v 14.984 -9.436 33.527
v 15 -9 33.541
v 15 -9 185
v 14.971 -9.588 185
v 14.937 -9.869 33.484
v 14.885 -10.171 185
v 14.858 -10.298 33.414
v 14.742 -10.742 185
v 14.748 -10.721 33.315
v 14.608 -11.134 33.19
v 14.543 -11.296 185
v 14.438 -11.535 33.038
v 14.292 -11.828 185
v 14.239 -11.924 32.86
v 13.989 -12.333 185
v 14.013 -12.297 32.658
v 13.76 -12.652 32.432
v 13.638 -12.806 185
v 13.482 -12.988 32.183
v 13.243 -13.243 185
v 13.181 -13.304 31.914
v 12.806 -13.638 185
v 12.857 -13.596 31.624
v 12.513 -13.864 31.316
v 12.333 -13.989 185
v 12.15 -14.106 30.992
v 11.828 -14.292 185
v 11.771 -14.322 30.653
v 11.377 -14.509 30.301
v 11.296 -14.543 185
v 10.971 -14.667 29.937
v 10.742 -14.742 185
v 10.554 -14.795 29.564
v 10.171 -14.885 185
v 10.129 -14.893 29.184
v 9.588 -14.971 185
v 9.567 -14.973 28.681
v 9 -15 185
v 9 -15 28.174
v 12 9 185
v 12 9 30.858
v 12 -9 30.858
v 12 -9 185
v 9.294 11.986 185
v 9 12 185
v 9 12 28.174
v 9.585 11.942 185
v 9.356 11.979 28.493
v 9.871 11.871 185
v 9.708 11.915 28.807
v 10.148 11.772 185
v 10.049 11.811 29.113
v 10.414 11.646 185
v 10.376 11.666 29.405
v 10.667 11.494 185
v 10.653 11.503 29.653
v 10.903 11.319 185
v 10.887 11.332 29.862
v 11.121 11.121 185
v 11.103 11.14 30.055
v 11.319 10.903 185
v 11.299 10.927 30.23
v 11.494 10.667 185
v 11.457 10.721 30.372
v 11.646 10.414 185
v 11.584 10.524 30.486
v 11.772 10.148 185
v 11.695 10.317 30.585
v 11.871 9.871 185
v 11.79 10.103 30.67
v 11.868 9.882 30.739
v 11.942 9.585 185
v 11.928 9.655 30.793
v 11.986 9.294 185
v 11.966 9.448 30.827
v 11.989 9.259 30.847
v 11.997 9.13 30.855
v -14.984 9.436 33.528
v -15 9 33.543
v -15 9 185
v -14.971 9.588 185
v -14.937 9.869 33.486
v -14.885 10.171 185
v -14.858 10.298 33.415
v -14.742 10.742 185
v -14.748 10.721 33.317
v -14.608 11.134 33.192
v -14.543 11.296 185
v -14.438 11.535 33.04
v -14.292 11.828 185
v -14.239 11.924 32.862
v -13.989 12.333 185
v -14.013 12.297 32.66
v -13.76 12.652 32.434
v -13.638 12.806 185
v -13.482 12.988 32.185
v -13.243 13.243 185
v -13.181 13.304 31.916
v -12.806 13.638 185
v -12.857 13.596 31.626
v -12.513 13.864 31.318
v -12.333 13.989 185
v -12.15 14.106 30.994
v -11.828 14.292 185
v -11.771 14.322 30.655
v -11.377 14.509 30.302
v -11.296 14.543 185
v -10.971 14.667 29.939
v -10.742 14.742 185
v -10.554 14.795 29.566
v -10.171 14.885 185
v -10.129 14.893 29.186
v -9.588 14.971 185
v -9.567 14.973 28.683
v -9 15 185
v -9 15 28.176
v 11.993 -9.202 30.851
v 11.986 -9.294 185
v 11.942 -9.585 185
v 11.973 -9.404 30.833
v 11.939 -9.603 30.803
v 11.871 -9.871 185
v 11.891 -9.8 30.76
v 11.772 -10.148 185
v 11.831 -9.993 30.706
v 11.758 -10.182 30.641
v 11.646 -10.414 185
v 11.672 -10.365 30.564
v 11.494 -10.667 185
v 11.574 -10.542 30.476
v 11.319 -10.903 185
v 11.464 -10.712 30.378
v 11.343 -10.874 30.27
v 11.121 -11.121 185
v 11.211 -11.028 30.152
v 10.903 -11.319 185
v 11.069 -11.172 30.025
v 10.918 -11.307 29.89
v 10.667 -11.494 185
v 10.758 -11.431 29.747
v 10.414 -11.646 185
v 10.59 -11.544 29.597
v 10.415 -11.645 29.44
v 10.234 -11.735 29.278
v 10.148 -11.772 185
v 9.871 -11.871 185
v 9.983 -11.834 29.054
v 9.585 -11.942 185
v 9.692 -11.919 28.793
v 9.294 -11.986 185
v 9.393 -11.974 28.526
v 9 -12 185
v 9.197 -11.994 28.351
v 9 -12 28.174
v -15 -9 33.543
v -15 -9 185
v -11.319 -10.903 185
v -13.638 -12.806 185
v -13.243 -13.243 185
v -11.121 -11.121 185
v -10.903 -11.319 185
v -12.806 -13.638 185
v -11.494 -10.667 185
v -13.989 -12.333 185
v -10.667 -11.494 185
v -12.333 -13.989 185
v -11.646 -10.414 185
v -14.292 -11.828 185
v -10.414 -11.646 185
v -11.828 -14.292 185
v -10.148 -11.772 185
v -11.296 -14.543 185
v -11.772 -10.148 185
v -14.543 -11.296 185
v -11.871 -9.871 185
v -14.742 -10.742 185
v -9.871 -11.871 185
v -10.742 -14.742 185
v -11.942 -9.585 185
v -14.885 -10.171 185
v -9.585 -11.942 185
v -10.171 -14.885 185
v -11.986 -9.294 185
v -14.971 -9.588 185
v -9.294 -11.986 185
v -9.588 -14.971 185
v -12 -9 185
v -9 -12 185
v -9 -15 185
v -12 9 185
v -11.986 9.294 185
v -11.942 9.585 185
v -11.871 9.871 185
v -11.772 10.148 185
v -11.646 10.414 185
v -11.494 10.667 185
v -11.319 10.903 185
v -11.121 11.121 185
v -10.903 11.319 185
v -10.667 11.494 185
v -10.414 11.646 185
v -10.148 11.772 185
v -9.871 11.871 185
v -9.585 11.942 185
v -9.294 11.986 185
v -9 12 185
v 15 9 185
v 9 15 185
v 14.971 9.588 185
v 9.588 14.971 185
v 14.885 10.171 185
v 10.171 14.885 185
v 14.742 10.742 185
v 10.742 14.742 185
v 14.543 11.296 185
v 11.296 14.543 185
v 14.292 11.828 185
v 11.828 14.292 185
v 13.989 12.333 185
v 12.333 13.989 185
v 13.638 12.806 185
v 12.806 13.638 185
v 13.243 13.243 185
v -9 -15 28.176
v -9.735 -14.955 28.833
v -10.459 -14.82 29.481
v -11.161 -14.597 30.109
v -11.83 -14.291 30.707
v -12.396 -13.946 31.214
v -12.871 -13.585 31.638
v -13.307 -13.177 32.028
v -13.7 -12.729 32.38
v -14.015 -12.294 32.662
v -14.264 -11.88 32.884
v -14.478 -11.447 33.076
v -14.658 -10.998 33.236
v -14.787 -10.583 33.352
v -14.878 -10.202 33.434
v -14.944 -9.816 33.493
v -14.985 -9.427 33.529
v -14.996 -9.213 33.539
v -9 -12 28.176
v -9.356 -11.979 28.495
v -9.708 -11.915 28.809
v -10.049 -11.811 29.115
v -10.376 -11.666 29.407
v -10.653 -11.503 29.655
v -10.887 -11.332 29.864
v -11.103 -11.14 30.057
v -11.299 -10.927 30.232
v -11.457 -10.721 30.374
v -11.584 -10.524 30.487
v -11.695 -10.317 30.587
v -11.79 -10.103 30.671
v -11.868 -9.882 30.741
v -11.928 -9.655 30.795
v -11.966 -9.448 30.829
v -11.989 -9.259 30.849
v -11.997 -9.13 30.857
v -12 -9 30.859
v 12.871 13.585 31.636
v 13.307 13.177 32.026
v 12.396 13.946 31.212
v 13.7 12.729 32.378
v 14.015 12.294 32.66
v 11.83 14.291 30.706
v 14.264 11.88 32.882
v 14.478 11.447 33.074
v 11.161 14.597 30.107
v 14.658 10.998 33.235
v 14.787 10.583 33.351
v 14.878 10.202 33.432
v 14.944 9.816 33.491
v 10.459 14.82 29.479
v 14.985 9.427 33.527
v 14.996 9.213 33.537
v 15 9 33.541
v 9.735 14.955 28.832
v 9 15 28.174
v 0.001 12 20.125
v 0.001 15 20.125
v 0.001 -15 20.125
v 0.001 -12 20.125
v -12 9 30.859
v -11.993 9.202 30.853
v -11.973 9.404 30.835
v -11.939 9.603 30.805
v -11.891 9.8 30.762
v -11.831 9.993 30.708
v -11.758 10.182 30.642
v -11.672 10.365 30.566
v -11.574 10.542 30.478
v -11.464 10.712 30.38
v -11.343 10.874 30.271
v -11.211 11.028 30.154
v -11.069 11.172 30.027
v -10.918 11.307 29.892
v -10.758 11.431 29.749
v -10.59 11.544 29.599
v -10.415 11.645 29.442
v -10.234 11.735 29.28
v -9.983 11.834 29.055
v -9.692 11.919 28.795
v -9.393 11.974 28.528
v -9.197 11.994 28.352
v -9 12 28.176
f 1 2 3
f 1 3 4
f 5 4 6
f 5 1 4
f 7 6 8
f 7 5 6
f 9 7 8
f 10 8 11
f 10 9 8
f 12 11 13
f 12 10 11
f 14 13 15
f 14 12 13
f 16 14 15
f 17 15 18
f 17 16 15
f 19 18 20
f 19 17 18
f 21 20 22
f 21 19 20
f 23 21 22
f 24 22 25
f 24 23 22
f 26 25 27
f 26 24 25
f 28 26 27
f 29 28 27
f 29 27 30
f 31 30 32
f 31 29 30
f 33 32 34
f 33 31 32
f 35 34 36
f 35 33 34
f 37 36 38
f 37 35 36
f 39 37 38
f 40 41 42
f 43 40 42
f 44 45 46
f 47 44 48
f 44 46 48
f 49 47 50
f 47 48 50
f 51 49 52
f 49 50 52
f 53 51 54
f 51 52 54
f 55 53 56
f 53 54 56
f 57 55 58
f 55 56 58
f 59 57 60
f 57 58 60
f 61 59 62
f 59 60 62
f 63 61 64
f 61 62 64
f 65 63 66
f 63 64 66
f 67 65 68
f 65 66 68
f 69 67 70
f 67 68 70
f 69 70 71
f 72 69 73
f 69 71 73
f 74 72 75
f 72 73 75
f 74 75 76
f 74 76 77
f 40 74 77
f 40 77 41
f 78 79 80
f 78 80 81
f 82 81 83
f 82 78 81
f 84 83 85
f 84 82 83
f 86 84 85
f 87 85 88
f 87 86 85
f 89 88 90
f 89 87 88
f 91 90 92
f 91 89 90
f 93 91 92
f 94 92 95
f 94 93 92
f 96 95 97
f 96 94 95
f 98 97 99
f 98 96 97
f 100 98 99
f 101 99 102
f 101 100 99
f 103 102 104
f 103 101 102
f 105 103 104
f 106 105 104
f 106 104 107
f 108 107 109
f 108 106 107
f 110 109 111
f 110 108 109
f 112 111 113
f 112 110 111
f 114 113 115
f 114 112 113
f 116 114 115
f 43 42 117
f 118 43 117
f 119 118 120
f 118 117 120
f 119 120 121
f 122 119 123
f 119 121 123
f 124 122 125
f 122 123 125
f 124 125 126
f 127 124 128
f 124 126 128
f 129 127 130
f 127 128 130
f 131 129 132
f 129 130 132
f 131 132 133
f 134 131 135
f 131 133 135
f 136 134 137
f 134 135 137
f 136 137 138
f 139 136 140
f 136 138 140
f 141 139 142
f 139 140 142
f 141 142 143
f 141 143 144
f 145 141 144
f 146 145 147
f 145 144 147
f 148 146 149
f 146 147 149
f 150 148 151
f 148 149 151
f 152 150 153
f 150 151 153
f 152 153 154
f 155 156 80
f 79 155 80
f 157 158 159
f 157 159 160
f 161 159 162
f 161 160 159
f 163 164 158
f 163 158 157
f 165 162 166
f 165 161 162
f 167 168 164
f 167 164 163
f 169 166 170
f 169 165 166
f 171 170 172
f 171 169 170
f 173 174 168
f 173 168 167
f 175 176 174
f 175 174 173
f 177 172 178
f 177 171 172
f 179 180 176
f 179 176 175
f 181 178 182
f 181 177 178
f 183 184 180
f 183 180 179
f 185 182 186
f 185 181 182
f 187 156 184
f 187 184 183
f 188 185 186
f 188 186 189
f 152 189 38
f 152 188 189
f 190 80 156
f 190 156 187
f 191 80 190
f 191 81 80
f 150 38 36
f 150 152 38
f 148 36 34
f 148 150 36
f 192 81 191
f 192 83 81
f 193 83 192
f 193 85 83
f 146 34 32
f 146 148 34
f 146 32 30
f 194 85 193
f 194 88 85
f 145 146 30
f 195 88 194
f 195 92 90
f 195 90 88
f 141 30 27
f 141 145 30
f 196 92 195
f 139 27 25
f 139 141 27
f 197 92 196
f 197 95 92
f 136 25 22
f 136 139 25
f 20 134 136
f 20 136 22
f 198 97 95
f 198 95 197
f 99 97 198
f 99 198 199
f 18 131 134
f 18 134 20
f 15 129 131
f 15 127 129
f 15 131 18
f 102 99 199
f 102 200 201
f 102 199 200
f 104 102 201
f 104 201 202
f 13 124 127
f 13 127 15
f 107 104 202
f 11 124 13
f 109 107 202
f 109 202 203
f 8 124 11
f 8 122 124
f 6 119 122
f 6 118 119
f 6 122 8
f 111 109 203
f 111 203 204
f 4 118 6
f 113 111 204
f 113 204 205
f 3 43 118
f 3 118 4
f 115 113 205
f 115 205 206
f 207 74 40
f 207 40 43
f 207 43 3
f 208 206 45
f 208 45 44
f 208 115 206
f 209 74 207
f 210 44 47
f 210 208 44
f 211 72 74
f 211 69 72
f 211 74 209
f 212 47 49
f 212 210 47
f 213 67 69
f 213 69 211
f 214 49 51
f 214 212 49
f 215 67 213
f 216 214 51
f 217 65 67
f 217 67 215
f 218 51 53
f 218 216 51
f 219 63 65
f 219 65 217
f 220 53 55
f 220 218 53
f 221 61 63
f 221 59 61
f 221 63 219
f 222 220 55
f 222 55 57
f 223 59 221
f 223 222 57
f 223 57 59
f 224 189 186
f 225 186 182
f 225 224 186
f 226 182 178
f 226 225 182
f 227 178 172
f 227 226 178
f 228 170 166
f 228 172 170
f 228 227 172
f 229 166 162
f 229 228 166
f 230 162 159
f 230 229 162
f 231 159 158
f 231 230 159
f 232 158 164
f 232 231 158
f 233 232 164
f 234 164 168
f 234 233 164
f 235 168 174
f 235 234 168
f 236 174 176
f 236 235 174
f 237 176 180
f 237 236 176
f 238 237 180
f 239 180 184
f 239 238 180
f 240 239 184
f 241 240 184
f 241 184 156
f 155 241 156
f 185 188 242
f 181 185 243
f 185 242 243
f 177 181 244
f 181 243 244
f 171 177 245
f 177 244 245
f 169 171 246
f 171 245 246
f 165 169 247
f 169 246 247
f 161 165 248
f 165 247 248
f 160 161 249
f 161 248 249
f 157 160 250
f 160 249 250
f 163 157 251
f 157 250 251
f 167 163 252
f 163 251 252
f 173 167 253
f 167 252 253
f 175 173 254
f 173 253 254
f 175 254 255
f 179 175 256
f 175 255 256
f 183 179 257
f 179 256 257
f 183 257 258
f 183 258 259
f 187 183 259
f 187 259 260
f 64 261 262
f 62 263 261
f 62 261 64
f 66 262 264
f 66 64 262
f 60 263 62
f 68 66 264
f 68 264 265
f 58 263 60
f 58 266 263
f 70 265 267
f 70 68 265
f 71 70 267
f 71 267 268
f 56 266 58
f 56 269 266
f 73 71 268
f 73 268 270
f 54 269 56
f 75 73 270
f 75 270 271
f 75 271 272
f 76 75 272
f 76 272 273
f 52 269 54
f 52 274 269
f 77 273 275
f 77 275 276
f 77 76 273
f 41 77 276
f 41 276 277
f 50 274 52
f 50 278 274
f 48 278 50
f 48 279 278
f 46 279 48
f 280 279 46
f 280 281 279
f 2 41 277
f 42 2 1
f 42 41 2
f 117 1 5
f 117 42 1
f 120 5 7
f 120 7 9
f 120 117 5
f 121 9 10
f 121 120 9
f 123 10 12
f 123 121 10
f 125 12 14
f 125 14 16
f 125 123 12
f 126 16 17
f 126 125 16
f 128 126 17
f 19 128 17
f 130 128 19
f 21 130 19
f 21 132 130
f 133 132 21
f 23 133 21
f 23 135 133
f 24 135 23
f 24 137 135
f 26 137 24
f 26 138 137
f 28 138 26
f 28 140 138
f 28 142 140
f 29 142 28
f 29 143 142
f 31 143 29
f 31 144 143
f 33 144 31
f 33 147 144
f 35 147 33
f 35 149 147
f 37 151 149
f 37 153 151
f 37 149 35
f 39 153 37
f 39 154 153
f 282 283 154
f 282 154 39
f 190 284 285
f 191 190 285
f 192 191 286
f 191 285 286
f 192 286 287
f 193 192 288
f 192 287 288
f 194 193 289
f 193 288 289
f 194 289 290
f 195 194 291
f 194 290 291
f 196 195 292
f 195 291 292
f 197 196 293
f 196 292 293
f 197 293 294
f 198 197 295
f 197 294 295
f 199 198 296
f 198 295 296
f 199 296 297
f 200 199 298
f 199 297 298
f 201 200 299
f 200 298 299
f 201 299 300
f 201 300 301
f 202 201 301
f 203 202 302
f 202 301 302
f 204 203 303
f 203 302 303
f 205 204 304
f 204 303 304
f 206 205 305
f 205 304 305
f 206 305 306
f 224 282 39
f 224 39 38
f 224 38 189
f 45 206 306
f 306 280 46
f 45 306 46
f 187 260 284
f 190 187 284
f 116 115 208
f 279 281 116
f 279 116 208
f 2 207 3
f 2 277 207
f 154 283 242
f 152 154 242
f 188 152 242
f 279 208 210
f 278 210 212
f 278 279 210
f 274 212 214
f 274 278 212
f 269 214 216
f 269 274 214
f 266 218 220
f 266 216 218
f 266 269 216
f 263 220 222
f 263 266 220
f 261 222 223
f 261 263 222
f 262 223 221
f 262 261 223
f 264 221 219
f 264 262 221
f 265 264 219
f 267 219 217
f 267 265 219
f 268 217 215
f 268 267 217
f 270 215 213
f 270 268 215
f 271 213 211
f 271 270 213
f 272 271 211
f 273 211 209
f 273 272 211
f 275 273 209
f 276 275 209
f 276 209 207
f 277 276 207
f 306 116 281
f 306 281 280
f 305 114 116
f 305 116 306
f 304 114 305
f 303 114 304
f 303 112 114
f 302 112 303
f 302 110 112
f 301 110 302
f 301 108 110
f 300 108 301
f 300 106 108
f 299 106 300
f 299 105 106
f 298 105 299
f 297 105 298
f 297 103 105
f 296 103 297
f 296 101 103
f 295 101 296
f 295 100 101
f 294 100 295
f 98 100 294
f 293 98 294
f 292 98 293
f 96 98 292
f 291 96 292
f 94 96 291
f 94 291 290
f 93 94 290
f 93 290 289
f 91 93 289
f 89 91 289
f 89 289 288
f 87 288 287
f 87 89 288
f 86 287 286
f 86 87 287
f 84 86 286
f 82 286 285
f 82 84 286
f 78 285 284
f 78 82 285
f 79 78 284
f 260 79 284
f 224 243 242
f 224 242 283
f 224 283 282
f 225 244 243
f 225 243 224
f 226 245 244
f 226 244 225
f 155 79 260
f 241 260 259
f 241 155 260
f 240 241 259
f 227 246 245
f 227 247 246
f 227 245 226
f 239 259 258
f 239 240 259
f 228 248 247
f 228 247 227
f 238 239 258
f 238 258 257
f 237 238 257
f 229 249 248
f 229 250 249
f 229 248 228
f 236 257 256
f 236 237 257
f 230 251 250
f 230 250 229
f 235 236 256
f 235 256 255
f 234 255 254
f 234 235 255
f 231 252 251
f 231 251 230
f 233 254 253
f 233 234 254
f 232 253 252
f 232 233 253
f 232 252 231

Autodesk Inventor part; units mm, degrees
ref_plane "Start Plane" through (0, 0, 20.1246) normal (0, 0, 1) x (1, 0, 0)
ref_plane "End Plane" through (0, 0, 185) normal (0, 0, 1) x (1, 0, 0)
sketch "Sketch" plane through (0, 0, 0) normal (0, 0, 1) x (1, 0, 0)
  line L0 (-15, -9) -> (-15, 9)
  line L1 (-9, 15) -> (9, 15)
  line L2 (15, 9) -> (15, -9)
  line L3 (9, -15) -> (-9, -15)
  arc A0 (-15, -9) -> (-9, -15) centre (-9, -9) ccw
  arc A1 (-9, 15) -> (-15, 9) centre (-9, 9) ccw
  arc A2 (15, 9) -> (9, 15) centre (9, 9) ccw
  arc A3 (9, -15) -> (15, -9) centre (9, -9) ccw
  arc A4 (-9, 12) -> (-12, 9) centre (-9, 9) ccw
  line L4 (-9, 12) -> (9, 12)
  arc A5 (12, 9) -> (9, 12) centre (9, 9) ccw
  line L5 (12, 9) -> (12, -9)
  arc A6 (9, -12) -> (12, -9) centre (9, -9) ccw
  line L6 (9, -12) -> (-9, -12)
  arc A7 (-12, -9) -> (-9, -12) centre (-9, -9) ccw
  line L7 (-12, -9) -> (-12, 9)
  line L8 (0, 22.7397) -> (0, -22.7397) construction
  line L9 (-22.7397, 0) -> (22.7397, 0) construction
  dimension "d7" = 6
  dimension "d10" = 30
  dimension "d11" = 30
  dimension "d12" = 3
  dimension "d15" = 15
  dimension "d16" = 15
extrude "Body" add sketch "Sketch" along normal up to surface (164.8754 mm away) from surface at 20.1246
sketch "Sketch3" plane through (0, 0, 0) normal (0, 0, 1) x (1, 0, 0)
  line L0 (0, 0) -> (10, 0)
ref_plane "Work Plane3" through (0, 0, 0) normal (0, -1, 0) x (1, 0, 0)
ref_plane "Work Plane4" through (-839, 9, 185) normal (0, 0, 1) x (1, 0, 0)
split "Split1" plane through (-839, 9, 185) removes the side toward (0, 0, 1)
ref_plane "Work Plane5" through (-10, -9, 11.1803) normal (0.6667, 0, -0.7454) x (-0.7454, 0, -0.6667)
split "Split2" plane through (-10, -9, 11.1803) removes the side toward (0.6667, 0, -0.7454)
ref_plane "Work Plane6" through (-213.6068, -9, 211.1803) normal (-0.6667, 0, -0.7454) x (-0.7454, 0, 0.6667)
split "Split3" plane through (-213.6068, -9, 211.1803) removes the side toward (-0.6667, 0, -0.7454)
sketch "Sketch4" plane through (0, 0, 0) normal (0, -1, 0) x (1, 0, 0)
  line L0 (-2, 20.1246) -> (12, 20.1246) projected
  line L1 (-2, 185) -> (12, 185) projected
  dimension "d18" = 164.8754
equation "\"d7\" = G_IR"
equation "\"d10\" = G_H"
equation "\"d11\" = G_W"
equation "\"d12\" = G_T"
equation "\"d15\" = 0.5 * d10"
equation "\"d16\" = 0.5 * d11"
equation "\"d3\" = G_L"
equation "\"G_W\" = 30"
equation "\"G_H\" = 30"
equation "\"G_T\" = 3"
equation "\"G_IR\" = 6"
equation "\"G_L\" = d18"
equation "\"G_OFFSET_START\" = -20.12461"
equation "\"G_OFFSET_END\" = -15"
equation "\"d13\" = -G_OFFSET_START"
equation "\"d14\" = G_OFFSET_END + B_L"
equation "\"B_L\" = 200"
properties part number "DIN EN 10219-2 - 30 x 30 x 3  - 164.88" material "Steel, Mild"
